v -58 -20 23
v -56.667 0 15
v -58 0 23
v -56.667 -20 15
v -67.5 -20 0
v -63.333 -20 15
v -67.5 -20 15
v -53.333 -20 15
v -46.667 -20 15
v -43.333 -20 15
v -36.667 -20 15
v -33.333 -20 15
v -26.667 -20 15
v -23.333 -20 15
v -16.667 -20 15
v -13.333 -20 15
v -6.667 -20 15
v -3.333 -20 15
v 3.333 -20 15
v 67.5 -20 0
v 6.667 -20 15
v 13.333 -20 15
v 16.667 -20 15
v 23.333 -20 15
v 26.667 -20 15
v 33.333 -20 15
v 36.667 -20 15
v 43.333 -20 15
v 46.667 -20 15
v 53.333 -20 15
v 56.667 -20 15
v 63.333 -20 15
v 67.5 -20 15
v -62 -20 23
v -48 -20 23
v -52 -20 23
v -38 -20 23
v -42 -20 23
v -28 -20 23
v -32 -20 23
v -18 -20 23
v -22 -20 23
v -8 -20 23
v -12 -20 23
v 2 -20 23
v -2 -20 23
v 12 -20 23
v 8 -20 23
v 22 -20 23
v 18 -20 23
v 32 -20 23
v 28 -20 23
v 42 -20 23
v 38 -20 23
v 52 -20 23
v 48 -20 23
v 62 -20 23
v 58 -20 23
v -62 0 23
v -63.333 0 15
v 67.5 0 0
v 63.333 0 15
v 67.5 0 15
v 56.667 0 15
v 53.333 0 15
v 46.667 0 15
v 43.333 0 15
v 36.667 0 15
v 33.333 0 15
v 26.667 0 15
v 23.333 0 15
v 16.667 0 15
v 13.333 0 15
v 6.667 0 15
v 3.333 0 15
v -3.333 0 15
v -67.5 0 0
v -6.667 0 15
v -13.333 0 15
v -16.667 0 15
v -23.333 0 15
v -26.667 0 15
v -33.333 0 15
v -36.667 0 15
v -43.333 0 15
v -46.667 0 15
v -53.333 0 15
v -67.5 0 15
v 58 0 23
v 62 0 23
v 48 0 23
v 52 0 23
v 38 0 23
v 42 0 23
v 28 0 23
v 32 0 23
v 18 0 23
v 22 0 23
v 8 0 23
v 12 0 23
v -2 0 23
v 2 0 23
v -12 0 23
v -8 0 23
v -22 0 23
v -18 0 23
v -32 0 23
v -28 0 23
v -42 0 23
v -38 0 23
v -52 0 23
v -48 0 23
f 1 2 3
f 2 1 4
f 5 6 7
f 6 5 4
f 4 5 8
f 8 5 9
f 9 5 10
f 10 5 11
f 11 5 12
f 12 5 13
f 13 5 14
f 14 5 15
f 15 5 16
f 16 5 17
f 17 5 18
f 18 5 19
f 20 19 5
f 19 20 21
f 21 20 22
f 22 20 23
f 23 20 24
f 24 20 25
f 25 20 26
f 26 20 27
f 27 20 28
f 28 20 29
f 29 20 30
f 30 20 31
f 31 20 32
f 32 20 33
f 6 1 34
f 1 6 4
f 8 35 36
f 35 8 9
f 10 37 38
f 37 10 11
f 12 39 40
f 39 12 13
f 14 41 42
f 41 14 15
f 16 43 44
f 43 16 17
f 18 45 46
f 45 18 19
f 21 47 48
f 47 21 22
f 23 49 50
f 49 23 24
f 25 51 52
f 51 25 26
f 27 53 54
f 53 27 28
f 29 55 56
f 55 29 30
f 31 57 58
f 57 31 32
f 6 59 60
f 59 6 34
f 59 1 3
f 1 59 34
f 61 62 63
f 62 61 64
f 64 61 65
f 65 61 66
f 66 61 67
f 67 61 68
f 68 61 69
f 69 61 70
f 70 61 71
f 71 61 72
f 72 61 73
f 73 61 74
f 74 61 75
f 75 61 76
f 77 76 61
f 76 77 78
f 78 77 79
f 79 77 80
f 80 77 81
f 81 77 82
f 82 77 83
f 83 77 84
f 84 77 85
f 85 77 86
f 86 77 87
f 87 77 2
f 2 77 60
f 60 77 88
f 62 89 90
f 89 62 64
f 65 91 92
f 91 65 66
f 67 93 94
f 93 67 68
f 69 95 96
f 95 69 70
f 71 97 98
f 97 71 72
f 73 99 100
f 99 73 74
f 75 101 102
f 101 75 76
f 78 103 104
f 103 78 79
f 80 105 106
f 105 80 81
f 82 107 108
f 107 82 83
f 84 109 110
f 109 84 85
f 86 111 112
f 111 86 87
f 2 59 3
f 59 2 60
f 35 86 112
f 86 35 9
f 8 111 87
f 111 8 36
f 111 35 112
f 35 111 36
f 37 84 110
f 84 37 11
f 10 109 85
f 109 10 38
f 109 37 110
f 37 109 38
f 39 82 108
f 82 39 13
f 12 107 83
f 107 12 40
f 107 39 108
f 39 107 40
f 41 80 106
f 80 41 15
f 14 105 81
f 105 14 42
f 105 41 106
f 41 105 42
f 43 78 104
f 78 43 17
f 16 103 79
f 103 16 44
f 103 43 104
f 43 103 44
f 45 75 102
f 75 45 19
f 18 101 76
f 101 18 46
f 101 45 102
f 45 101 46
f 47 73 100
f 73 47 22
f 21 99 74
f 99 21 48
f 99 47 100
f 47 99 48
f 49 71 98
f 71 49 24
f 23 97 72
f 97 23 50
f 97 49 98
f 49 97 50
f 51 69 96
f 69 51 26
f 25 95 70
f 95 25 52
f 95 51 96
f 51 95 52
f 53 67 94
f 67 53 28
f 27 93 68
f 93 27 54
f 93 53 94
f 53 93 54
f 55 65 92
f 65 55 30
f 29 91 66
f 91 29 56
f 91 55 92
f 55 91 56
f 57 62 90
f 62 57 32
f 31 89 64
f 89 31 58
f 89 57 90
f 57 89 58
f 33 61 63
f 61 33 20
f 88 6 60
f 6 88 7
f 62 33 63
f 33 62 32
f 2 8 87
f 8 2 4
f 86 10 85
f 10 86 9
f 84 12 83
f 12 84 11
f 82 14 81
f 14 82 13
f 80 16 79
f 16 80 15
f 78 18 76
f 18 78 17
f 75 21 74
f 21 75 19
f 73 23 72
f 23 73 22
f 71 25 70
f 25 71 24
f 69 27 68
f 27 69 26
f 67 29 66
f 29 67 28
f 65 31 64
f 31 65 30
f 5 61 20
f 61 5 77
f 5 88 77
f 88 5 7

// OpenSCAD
$fn = 32;

// ----------------------------------------------------------------------
// Toothed rack, 13 teeth
// 10 mm pitch, 8 mm teeth
// ----------------------------------------------------------------------

// --- parameters (mm) ---
bar_w = 20;   // bar width (Y)
bar_h = 15;   // bar height (Z)
teeth = 13;   // number of teeth
pitch = 10;   // tooth pitch
tooth_h = 8;  // tooth height above the bar
root_w = 7;   // tooth width at the root
crest_w = 4;  // tooth width at the crest

// --- derived feature positions (mm) ---
span = (teeth - 1) * pitch;  // = 120   distance between the outer teeth
bar_l = span + root_w + 8;   // = 135   bar length: teeth plus 4 mm at each end
tooth_x = -span / 2;         // = -60   X of the first tooth
height = bar_h + tooth_h;    // = 23   overall height
feature_centers = [
  [tooth_x + 0 * pitch, -bar_w / 2],
  [tooth_x + 1 * pitch, -bar_w / 2],
  [tooth_x + 2 * pitch, -bar_w / 2],
  [tooth_x + 3 * pitch, -bar_w / 2],
  [tooth_x + 4 * pitch, -bar_w / 2],
  [tooth_x + 5 * pitch, -bar_w / 2],
  [tooth_x + 6 * pitch, -bar_w / 2],
  [tooth_x + 7 * pitch, -bar_w / 2],
  [tooth_x + 8 * pitch, -bar_w / 2],
  [tooth_x + 9 * pitch, -bar_w / 2],
  [tooth_x + 10 * pitch, -bar_w / 2],
  [tooth_x + 11 * pitch, -bar_w / 2],
  [tooth_x + 12 * pitch, -bar_w / 2]
];   // tooth centre line, drives the tooth loop

// bar with a rack of teeth, one extruded trapezoium per centre
module rack_tooth() {
  linear_extrude(height = bar_w)
    polygon(points = [
      [0, 0],
      [root_w, 0],
      [root_w / 2 + crest_w / 2, tooth_h + 1],
      [root_w / 2 - crest_w / 2, tooth_h + 1]
    ]);
}

union() {
  translate([-bar_l / 2, -bar_w, 0]) cube([bar_l, bar_w, bar_h]);
  for (centre = feature_centers)
    translate([centre[0] - root_w / 2, 0, bar_h - 1]) rotate([90, 0, 0]) rack_tooth();
}
